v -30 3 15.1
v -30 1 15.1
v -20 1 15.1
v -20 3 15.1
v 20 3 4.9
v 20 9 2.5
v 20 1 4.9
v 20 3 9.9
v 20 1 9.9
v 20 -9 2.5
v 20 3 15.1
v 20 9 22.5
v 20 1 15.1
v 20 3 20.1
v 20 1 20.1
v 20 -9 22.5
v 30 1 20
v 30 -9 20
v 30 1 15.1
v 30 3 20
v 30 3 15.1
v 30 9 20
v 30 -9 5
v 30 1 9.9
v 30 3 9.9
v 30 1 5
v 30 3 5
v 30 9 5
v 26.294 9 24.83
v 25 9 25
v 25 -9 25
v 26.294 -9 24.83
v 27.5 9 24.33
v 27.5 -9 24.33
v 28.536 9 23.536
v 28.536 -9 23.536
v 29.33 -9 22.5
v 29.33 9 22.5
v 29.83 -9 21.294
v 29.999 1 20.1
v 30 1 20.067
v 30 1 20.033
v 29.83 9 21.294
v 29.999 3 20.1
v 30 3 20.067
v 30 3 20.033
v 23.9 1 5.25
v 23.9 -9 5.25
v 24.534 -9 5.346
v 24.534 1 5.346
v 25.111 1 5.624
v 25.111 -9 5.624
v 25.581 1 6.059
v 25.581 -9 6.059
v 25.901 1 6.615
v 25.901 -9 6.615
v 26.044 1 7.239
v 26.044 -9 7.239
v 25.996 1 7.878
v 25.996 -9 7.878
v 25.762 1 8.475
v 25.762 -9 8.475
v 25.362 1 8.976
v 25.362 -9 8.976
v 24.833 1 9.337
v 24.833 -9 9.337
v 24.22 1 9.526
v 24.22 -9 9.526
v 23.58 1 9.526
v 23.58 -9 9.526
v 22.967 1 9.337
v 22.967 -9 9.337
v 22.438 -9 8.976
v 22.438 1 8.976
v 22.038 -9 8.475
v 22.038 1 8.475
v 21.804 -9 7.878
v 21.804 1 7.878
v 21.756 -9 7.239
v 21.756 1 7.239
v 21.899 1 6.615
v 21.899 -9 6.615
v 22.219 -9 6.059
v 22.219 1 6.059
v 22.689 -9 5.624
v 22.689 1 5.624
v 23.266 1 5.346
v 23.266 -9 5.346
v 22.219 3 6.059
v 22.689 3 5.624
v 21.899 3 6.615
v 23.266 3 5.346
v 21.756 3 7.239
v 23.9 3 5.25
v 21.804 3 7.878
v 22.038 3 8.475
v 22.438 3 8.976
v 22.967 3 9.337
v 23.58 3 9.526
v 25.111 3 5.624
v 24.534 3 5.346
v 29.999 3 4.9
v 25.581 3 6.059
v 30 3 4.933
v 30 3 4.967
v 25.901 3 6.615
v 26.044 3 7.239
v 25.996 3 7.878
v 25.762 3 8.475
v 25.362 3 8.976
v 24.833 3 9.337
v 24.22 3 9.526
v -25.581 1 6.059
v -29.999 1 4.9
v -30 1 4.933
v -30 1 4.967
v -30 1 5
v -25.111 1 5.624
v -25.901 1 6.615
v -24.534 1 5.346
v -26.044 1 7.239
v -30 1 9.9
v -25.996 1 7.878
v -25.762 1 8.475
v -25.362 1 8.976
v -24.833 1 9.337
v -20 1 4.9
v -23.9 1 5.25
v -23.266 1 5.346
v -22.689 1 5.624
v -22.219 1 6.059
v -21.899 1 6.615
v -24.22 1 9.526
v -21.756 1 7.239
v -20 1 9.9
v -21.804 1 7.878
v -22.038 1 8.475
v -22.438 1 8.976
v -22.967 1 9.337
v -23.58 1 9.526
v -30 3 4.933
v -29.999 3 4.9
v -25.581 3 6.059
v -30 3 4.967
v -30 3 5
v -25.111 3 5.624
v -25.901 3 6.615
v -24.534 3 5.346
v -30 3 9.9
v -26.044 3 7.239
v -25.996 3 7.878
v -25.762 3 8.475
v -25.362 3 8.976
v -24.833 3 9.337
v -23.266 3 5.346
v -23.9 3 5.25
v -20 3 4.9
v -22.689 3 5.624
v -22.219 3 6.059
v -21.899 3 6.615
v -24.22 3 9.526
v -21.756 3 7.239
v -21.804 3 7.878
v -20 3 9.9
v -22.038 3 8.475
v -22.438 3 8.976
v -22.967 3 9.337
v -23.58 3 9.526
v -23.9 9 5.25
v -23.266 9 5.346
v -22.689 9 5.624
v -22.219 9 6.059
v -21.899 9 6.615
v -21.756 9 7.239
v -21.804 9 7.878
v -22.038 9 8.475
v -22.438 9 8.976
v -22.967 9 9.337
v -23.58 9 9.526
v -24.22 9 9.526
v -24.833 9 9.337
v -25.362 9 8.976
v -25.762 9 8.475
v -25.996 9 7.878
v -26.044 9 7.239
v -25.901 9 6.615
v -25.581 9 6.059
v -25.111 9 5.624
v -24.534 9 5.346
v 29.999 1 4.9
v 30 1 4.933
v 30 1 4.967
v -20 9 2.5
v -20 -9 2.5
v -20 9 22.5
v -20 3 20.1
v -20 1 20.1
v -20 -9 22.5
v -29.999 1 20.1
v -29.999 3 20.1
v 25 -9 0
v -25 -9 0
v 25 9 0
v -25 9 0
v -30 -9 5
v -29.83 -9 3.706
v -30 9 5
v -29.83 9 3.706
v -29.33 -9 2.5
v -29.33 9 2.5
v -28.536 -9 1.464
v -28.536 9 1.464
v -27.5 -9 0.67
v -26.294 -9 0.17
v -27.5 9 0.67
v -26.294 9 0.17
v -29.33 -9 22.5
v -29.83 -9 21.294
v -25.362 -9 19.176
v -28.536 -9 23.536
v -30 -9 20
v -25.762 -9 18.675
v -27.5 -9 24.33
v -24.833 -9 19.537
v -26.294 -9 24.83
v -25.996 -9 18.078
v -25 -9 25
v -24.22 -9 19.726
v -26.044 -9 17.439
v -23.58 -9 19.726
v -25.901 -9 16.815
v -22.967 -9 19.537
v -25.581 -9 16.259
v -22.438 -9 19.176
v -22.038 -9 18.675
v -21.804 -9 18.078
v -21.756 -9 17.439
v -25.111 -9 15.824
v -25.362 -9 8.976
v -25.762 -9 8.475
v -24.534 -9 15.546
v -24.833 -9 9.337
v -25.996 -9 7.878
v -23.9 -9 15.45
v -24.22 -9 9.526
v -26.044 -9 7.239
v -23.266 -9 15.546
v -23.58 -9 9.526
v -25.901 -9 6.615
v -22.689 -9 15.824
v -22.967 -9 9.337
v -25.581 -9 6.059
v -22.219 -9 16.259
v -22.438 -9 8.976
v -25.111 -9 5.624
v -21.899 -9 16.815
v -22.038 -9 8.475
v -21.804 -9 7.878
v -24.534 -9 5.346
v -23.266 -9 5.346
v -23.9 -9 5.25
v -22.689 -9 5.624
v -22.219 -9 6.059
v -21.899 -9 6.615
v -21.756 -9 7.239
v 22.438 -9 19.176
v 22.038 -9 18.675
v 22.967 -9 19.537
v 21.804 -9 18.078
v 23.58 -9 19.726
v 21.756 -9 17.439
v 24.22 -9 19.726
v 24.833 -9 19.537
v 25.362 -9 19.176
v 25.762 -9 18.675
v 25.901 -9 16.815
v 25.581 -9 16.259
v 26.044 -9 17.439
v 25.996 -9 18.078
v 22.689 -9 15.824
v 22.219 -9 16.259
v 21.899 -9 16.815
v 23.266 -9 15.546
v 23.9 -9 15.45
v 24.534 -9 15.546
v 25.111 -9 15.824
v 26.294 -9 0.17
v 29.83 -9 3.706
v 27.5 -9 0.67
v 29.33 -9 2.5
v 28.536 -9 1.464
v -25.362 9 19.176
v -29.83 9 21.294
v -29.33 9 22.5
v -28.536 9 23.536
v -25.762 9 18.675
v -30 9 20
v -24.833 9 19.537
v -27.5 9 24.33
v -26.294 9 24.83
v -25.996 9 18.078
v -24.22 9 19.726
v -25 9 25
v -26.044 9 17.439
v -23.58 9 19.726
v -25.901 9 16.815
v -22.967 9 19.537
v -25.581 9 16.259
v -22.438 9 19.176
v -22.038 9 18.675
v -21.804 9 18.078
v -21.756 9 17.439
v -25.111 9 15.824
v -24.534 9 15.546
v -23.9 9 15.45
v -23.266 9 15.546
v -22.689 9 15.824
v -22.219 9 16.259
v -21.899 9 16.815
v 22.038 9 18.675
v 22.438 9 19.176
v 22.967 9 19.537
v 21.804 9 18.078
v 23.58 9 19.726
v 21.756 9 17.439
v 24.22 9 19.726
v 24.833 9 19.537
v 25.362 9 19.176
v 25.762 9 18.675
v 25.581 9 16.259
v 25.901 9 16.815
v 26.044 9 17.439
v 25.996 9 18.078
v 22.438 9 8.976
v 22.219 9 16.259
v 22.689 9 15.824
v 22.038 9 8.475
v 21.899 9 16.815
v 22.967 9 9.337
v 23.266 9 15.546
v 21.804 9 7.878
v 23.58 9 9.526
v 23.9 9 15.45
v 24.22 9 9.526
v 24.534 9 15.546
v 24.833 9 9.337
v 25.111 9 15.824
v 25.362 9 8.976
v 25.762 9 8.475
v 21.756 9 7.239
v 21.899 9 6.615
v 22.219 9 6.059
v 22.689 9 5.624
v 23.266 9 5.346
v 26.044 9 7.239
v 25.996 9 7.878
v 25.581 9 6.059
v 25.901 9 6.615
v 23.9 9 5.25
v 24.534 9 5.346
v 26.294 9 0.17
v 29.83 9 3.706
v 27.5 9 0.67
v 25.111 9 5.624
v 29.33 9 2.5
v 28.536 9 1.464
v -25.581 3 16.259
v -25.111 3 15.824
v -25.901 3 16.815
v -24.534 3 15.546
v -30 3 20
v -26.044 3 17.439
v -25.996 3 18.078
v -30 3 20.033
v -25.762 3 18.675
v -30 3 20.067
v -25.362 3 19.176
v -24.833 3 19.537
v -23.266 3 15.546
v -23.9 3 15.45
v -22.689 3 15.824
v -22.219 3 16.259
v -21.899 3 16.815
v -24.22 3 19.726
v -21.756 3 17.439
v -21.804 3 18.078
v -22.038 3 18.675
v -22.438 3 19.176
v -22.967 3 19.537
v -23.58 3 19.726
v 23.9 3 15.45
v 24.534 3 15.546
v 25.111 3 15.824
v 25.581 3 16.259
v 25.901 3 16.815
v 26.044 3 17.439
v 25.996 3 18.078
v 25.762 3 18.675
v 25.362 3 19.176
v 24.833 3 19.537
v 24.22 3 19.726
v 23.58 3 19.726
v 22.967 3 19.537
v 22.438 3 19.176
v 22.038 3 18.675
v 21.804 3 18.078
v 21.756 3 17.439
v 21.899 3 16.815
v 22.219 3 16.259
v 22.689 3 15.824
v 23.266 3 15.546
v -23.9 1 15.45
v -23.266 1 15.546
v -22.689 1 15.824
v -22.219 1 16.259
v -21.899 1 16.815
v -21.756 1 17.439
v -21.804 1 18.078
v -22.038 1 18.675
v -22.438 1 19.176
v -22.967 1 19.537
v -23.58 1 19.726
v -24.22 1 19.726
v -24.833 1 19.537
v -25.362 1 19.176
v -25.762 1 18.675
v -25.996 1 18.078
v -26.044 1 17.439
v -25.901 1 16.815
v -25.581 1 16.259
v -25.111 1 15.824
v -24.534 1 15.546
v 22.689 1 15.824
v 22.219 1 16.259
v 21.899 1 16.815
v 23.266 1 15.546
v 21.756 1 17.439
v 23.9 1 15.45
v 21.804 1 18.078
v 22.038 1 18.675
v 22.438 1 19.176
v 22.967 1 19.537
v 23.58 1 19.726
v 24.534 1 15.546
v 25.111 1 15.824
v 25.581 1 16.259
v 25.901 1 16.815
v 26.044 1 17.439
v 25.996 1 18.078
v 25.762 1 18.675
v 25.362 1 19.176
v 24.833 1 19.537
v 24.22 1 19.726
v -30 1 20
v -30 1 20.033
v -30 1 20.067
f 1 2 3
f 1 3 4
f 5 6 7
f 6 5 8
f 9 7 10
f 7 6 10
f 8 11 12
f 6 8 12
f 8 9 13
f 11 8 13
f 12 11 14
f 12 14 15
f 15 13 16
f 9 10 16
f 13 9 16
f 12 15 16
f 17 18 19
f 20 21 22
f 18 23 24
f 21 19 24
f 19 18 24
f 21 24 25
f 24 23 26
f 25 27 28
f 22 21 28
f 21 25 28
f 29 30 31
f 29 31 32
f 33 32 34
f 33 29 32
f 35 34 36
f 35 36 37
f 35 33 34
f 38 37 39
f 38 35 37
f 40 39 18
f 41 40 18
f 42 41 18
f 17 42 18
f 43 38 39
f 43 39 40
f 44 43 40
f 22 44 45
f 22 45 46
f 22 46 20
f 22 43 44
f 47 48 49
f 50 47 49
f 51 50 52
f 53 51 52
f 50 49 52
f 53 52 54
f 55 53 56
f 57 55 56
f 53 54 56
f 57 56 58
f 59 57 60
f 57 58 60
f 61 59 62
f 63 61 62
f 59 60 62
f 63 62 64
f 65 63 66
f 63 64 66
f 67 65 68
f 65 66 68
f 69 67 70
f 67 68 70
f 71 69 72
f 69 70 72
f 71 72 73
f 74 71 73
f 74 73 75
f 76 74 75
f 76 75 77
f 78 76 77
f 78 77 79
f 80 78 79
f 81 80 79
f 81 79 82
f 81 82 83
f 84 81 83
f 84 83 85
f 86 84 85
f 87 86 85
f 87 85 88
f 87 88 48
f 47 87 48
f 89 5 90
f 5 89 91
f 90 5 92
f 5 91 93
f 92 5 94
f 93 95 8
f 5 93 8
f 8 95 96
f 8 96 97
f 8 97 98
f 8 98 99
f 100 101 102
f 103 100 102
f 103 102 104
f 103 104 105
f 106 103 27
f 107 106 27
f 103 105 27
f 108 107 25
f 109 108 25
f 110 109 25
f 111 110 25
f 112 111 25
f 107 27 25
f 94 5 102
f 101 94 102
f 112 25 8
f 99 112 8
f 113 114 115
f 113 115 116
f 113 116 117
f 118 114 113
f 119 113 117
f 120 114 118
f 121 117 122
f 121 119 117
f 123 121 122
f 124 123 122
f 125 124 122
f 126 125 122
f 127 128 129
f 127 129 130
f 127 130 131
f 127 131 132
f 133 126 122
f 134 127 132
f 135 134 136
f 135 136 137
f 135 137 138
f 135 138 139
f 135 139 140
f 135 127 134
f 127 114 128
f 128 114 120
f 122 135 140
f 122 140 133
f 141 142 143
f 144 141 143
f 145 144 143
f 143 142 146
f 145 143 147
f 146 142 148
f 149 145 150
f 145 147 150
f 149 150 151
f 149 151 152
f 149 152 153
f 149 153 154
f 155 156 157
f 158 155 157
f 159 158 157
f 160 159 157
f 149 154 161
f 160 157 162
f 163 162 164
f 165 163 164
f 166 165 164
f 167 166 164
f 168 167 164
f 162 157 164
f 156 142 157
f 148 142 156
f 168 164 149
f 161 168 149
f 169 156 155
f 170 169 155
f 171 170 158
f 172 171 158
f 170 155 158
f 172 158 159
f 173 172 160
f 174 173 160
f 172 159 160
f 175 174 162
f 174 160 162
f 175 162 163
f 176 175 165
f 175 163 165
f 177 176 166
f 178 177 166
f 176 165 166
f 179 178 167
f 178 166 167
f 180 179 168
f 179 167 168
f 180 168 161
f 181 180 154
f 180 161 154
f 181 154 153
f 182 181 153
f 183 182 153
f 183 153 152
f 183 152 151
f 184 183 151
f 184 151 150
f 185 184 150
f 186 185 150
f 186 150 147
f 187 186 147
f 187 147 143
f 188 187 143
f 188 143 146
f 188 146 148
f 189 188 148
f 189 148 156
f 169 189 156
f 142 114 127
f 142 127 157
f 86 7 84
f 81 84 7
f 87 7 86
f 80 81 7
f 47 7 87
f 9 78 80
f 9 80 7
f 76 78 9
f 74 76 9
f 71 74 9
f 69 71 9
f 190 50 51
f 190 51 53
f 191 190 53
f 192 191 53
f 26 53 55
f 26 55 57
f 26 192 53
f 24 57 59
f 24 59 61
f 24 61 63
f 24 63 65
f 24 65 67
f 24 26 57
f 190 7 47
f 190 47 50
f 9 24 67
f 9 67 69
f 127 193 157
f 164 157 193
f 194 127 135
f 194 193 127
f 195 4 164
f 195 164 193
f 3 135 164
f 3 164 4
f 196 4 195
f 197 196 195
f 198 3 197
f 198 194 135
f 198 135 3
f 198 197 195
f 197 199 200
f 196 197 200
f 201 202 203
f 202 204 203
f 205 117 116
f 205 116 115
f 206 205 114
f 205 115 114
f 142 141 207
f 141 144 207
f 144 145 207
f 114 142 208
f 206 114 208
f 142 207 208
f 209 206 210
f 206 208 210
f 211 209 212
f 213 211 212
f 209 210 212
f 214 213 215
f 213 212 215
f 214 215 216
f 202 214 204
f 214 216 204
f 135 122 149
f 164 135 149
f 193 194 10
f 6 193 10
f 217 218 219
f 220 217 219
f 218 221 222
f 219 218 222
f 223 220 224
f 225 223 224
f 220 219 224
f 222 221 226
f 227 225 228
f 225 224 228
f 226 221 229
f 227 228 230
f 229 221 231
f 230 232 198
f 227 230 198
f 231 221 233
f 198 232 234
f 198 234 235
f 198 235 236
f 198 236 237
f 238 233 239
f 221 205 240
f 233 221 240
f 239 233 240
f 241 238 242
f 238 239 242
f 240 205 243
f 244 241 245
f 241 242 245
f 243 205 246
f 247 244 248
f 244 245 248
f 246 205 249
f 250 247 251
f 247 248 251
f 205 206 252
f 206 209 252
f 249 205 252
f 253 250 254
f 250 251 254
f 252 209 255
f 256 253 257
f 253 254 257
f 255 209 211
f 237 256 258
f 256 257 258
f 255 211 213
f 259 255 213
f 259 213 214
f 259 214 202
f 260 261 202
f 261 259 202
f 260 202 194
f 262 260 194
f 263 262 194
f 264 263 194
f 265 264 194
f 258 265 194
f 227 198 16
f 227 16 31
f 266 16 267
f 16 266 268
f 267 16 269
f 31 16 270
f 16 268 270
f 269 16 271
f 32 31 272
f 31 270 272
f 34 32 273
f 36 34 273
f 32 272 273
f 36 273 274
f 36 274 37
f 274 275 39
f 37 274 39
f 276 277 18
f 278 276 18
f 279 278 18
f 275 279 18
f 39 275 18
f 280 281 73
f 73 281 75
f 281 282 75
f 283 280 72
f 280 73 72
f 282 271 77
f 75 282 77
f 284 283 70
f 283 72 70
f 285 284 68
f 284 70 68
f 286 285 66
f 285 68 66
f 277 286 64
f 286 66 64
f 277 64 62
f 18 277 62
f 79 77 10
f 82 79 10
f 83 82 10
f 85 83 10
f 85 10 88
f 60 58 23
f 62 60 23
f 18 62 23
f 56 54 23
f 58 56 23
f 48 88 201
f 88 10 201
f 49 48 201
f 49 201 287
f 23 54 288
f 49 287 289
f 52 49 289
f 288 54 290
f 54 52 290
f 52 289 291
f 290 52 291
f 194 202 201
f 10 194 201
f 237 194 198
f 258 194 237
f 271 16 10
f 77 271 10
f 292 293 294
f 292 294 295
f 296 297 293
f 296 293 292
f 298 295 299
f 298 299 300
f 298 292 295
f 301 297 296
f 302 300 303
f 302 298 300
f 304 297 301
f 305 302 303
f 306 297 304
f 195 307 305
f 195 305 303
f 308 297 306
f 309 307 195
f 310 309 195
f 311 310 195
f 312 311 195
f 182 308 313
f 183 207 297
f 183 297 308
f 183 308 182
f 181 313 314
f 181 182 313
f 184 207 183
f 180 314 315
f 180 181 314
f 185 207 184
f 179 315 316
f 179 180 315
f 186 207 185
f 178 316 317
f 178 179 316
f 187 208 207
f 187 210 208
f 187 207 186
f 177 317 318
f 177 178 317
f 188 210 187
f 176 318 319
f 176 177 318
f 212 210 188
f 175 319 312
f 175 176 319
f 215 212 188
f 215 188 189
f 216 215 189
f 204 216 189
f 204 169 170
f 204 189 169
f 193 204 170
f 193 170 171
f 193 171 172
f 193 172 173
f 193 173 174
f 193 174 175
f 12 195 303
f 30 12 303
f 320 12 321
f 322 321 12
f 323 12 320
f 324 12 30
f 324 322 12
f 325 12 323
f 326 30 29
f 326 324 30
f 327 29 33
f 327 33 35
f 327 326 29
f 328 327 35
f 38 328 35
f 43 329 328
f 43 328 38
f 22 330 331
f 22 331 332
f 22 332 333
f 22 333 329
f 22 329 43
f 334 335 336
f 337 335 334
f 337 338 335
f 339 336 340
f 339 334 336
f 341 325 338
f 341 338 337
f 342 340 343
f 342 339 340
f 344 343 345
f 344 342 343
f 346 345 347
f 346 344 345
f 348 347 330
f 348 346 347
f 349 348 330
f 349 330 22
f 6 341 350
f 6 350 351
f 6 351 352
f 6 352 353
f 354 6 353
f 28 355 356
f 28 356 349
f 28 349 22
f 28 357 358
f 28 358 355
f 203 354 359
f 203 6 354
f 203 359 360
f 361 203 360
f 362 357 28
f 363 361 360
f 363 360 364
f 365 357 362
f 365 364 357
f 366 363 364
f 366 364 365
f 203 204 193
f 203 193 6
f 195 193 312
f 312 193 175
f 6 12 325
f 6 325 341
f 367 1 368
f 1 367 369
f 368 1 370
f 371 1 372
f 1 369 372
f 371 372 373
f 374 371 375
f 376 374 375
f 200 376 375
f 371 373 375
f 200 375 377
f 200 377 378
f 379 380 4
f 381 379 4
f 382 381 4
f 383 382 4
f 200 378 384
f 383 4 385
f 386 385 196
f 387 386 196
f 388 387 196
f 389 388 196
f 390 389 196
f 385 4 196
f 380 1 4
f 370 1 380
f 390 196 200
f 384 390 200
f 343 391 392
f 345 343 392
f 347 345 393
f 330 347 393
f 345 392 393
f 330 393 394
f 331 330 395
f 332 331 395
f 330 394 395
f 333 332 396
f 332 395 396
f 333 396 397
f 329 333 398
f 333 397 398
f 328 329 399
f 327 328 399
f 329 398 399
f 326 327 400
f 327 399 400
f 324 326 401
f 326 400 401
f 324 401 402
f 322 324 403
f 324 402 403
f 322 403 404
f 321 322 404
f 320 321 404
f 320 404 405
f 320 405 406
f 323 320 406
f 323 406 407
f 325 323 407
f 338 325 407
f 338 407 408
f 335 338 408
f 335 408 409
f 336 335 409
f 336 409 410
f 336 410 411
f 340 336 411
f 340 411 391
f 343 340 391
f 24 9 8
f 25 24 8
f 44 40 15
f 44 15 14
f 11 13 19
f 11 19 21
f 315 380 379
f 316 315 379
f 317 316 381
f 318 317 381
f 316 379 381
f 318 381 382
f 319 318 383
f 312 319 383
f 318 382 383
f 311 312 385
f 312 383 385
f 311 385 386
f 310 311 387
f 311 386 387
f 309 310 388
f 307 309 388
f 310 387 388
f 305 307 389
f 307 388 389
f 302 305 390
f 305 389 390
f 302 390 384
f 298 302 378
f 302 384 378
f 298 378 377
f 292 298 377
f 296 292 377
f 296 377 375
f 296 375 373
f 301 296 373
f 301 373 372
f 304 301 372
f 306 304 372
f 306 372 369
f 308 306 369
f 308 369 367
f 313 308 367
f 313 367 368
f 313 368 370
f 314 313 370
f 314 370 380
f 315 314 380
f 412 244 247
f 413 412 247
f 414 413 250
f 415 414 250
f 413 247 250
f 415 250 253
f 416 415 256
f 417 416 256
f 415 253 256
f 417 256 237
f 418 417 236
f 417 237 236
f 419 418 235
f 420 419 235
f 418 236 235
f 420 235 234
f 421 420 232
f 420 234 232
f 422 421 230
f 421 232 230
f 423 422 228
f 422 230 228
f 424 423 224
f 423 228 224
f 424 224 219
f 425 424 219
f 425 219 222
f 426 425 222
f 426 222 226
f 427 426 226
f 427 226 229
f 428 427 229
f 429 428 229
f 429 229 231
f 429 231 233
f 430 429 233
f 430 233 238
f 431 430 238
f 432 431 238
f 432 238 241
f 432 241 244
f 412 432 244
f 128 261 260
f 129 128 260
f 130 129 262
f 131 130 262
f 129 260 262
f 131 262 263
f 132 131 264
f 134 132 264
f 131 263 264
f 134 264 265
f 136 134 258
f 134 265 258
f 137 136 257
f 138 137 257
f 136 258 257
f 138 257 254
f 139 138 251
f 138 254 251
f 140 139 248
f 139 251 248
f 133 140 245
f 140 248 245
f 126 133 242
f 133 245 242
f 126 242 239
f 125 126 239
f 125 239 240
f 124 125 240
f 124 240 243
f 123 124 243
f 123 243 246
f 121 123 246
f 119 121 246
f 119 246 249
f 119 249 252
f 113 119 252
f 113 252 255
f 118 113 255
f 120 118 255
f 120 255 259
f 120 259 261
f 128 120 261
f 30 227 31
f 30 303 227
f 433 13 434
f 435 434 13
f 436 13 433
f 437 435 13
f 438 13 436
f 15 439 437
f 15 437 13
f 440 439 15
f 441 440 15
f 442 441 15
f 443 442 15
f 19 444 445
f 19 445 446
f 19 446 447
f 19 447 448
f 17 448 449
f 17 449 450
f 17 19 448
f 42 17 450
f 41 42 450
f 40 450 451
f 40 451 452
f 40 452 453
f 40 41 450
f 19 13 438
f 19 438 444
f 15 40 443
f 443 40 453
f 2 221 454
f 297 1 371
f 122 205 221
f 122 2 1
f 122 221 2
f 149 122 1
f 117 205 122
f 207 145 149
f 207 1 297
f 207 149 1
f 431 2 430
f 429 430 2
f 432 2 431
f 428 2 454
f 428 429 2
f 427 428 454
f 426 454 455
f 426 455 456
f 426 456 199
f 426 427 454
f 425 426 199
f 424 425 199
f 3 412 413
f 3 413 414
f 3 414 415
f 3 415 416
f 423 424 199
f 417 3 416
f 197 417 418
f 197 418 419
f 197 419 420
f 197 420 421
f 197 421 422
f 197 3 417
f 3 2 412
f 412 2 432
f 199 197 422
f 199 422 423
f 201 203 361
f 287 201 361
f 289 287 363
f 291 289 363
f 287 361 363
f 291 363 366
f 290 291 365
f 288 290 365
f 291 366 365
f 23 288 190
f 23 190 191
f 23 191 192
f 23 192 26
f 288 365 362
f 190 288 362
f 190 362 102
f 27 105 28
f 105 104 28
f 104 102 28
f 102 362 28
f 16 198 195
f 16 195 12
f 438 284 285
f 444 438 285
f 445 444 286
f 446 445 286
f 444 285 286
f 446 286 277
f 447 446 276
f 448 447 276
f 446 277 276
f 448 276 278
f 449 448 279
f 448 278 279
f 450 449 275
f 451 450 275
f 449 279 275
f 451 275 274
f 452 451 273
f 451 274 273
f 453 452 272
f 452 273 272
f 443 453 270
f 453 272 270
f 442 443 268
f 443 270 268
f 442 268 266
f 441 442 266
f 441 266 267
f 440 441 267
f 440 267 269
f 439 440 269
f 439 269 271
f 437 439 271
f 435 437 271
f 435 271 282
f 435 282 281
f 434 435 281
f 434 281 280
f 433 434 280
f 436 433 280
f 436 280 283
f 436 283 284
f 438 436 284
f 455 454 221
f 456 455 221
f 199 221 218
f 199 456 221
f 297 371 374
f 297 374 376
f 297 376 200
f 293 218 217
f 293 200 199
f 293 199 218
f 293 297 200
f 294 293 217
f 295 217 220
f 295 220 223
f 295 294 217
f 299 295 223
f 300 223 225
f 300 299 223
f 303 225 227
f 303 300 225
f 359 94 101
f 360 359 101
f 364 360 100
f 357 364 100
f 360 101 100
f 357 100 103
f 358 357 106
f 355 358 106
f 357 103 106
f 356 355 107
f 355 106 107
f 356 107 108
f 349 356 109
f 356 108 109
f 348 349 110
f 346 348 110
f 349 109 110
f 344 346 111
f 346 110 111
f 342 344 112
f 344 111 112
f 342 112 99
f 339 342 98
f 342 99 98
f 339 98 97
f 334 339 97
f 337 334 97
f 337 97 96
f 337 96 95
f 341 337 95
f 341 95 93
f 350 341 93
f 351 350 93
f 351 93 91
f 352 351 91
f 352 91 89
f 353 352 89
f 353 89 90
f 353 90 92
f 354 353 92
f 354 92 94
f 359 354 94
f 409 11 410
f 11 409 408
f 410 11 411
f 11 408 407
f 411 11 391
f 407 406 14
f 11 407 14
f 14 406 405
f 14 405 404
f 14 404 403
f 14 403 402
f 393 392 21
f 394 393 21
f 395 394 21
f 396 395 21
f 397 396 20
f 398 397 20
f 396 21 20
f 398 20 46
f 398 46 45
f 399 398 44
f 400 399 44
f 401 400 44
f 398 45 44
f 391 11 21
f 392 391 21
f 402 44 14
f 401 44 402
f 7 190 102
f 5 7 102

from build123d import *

# Parameters (mm, degrees)
ESQUISSE1_W                  = 60
ESQUISSE1_H                  = 18
BOSS_EXTRU_1_DEPTH           = 25
ESQUISSE2_W                  = 40
ESQUISSE2_H                  = 20
ENL_V_MAT_EXTRU_1_DEPTH      = 30
CONG_1_R                     = 5
ESQUISSE3_R                  = 2.15
ENL_V_MAT_EXTRU_2_DEPTH      = 30
ENL_V_MAT_EXTRU_3_DEPTH      = 66.620118866
ENL_V_MAT_EXTRU_3_DEPTH_BACK = 80
ESQUISSE4_W                  = 5
ESQUISSE4_H                  = 2


with BuildPart() as part:
    # Esquisse1 → Boss.-Extru.1 (new body)
    with BuildSketch(Plane.XY):
        Rectangle(ESQUISSE1_W, ESQUISSE1_H)
    extrude(amount=BOSS_EXTRU_1_DEPTH)

    # Esquisse2 → Enlèv. mat.-Extru.1 (cut)
    with BuildSketch(Plane.XZ.offset(9)):
        with Locations((0, 12.5)):
            Rectangle(ESQUISSE2_W, ESQUISSE2_H)
    extrude(amount=-ENL_V_MAT_EXTRU_1_DEPTH, mode=Mode.SUBTRACT)

    # Congé1
    cong_1_edges = [part.edges().sort_by_distance(p)[0] for p in [
        (-30, 0, 25),
        (30, 0, 25),
        (-30, 0, 0),
        (30, 0, 0),
    ]]
    fillet(cong_1_edges, radius=CONG_1_R)

    # Esquisse3 → Enlèv. mat.-Extru.2 (cut)
    with BuildSketch(Plane(origin=(0, -9, 0), x_dir=(-1, 0, 0), z_dir=(0, -1, 0))):
        with Locations(Location((23.9, -17.6, 0), (0, 0, 90))):
            Circle(ESQUISSE3_R)
        with Locations(Location((23.9, -7.4, 0), (0, 0, 90))):
            Circle(ESQUISSE3_R)
        with Locations(Location((-23.9, -7.4, 0), (0, 0, 90))):
            Circle(ESQUISSE3_R)
        with Locations(Location((-23.9, -17.6, 0), (0, 0, 90))):
            Circle(ESQUISSE3_R)
    extrude(amount=-ENL_V_MAT_EXTRU_2_DEPTH, mode=Mode.SUBTRACT)

    # Esquisse4 → Enlèv. mat.-Extru.3 (cut, two sides: drawn at the far end of the back side and taken through both)
    with BuildSketch(Plane.ZY.offset(30).offset(-ENL_V_MAT_EXTRU_3_DEPTH_BACK)):
        with Locations((7.4, 2)):
            Rectangle(ESQUISSE4_W, ESQUISSE4_H)
        with Locations((17.6, 2)):
            Rectangle(ESQUISSE4_W, ESQUISSE4_H)
    extrude(amount=ENL_V_MAT_EXTRU_3_DEPTH + ENL_V_MAT_EXTRU_3_DEPTH_BACK, mode=Mode.SUBTRACT)


solid = part.part
